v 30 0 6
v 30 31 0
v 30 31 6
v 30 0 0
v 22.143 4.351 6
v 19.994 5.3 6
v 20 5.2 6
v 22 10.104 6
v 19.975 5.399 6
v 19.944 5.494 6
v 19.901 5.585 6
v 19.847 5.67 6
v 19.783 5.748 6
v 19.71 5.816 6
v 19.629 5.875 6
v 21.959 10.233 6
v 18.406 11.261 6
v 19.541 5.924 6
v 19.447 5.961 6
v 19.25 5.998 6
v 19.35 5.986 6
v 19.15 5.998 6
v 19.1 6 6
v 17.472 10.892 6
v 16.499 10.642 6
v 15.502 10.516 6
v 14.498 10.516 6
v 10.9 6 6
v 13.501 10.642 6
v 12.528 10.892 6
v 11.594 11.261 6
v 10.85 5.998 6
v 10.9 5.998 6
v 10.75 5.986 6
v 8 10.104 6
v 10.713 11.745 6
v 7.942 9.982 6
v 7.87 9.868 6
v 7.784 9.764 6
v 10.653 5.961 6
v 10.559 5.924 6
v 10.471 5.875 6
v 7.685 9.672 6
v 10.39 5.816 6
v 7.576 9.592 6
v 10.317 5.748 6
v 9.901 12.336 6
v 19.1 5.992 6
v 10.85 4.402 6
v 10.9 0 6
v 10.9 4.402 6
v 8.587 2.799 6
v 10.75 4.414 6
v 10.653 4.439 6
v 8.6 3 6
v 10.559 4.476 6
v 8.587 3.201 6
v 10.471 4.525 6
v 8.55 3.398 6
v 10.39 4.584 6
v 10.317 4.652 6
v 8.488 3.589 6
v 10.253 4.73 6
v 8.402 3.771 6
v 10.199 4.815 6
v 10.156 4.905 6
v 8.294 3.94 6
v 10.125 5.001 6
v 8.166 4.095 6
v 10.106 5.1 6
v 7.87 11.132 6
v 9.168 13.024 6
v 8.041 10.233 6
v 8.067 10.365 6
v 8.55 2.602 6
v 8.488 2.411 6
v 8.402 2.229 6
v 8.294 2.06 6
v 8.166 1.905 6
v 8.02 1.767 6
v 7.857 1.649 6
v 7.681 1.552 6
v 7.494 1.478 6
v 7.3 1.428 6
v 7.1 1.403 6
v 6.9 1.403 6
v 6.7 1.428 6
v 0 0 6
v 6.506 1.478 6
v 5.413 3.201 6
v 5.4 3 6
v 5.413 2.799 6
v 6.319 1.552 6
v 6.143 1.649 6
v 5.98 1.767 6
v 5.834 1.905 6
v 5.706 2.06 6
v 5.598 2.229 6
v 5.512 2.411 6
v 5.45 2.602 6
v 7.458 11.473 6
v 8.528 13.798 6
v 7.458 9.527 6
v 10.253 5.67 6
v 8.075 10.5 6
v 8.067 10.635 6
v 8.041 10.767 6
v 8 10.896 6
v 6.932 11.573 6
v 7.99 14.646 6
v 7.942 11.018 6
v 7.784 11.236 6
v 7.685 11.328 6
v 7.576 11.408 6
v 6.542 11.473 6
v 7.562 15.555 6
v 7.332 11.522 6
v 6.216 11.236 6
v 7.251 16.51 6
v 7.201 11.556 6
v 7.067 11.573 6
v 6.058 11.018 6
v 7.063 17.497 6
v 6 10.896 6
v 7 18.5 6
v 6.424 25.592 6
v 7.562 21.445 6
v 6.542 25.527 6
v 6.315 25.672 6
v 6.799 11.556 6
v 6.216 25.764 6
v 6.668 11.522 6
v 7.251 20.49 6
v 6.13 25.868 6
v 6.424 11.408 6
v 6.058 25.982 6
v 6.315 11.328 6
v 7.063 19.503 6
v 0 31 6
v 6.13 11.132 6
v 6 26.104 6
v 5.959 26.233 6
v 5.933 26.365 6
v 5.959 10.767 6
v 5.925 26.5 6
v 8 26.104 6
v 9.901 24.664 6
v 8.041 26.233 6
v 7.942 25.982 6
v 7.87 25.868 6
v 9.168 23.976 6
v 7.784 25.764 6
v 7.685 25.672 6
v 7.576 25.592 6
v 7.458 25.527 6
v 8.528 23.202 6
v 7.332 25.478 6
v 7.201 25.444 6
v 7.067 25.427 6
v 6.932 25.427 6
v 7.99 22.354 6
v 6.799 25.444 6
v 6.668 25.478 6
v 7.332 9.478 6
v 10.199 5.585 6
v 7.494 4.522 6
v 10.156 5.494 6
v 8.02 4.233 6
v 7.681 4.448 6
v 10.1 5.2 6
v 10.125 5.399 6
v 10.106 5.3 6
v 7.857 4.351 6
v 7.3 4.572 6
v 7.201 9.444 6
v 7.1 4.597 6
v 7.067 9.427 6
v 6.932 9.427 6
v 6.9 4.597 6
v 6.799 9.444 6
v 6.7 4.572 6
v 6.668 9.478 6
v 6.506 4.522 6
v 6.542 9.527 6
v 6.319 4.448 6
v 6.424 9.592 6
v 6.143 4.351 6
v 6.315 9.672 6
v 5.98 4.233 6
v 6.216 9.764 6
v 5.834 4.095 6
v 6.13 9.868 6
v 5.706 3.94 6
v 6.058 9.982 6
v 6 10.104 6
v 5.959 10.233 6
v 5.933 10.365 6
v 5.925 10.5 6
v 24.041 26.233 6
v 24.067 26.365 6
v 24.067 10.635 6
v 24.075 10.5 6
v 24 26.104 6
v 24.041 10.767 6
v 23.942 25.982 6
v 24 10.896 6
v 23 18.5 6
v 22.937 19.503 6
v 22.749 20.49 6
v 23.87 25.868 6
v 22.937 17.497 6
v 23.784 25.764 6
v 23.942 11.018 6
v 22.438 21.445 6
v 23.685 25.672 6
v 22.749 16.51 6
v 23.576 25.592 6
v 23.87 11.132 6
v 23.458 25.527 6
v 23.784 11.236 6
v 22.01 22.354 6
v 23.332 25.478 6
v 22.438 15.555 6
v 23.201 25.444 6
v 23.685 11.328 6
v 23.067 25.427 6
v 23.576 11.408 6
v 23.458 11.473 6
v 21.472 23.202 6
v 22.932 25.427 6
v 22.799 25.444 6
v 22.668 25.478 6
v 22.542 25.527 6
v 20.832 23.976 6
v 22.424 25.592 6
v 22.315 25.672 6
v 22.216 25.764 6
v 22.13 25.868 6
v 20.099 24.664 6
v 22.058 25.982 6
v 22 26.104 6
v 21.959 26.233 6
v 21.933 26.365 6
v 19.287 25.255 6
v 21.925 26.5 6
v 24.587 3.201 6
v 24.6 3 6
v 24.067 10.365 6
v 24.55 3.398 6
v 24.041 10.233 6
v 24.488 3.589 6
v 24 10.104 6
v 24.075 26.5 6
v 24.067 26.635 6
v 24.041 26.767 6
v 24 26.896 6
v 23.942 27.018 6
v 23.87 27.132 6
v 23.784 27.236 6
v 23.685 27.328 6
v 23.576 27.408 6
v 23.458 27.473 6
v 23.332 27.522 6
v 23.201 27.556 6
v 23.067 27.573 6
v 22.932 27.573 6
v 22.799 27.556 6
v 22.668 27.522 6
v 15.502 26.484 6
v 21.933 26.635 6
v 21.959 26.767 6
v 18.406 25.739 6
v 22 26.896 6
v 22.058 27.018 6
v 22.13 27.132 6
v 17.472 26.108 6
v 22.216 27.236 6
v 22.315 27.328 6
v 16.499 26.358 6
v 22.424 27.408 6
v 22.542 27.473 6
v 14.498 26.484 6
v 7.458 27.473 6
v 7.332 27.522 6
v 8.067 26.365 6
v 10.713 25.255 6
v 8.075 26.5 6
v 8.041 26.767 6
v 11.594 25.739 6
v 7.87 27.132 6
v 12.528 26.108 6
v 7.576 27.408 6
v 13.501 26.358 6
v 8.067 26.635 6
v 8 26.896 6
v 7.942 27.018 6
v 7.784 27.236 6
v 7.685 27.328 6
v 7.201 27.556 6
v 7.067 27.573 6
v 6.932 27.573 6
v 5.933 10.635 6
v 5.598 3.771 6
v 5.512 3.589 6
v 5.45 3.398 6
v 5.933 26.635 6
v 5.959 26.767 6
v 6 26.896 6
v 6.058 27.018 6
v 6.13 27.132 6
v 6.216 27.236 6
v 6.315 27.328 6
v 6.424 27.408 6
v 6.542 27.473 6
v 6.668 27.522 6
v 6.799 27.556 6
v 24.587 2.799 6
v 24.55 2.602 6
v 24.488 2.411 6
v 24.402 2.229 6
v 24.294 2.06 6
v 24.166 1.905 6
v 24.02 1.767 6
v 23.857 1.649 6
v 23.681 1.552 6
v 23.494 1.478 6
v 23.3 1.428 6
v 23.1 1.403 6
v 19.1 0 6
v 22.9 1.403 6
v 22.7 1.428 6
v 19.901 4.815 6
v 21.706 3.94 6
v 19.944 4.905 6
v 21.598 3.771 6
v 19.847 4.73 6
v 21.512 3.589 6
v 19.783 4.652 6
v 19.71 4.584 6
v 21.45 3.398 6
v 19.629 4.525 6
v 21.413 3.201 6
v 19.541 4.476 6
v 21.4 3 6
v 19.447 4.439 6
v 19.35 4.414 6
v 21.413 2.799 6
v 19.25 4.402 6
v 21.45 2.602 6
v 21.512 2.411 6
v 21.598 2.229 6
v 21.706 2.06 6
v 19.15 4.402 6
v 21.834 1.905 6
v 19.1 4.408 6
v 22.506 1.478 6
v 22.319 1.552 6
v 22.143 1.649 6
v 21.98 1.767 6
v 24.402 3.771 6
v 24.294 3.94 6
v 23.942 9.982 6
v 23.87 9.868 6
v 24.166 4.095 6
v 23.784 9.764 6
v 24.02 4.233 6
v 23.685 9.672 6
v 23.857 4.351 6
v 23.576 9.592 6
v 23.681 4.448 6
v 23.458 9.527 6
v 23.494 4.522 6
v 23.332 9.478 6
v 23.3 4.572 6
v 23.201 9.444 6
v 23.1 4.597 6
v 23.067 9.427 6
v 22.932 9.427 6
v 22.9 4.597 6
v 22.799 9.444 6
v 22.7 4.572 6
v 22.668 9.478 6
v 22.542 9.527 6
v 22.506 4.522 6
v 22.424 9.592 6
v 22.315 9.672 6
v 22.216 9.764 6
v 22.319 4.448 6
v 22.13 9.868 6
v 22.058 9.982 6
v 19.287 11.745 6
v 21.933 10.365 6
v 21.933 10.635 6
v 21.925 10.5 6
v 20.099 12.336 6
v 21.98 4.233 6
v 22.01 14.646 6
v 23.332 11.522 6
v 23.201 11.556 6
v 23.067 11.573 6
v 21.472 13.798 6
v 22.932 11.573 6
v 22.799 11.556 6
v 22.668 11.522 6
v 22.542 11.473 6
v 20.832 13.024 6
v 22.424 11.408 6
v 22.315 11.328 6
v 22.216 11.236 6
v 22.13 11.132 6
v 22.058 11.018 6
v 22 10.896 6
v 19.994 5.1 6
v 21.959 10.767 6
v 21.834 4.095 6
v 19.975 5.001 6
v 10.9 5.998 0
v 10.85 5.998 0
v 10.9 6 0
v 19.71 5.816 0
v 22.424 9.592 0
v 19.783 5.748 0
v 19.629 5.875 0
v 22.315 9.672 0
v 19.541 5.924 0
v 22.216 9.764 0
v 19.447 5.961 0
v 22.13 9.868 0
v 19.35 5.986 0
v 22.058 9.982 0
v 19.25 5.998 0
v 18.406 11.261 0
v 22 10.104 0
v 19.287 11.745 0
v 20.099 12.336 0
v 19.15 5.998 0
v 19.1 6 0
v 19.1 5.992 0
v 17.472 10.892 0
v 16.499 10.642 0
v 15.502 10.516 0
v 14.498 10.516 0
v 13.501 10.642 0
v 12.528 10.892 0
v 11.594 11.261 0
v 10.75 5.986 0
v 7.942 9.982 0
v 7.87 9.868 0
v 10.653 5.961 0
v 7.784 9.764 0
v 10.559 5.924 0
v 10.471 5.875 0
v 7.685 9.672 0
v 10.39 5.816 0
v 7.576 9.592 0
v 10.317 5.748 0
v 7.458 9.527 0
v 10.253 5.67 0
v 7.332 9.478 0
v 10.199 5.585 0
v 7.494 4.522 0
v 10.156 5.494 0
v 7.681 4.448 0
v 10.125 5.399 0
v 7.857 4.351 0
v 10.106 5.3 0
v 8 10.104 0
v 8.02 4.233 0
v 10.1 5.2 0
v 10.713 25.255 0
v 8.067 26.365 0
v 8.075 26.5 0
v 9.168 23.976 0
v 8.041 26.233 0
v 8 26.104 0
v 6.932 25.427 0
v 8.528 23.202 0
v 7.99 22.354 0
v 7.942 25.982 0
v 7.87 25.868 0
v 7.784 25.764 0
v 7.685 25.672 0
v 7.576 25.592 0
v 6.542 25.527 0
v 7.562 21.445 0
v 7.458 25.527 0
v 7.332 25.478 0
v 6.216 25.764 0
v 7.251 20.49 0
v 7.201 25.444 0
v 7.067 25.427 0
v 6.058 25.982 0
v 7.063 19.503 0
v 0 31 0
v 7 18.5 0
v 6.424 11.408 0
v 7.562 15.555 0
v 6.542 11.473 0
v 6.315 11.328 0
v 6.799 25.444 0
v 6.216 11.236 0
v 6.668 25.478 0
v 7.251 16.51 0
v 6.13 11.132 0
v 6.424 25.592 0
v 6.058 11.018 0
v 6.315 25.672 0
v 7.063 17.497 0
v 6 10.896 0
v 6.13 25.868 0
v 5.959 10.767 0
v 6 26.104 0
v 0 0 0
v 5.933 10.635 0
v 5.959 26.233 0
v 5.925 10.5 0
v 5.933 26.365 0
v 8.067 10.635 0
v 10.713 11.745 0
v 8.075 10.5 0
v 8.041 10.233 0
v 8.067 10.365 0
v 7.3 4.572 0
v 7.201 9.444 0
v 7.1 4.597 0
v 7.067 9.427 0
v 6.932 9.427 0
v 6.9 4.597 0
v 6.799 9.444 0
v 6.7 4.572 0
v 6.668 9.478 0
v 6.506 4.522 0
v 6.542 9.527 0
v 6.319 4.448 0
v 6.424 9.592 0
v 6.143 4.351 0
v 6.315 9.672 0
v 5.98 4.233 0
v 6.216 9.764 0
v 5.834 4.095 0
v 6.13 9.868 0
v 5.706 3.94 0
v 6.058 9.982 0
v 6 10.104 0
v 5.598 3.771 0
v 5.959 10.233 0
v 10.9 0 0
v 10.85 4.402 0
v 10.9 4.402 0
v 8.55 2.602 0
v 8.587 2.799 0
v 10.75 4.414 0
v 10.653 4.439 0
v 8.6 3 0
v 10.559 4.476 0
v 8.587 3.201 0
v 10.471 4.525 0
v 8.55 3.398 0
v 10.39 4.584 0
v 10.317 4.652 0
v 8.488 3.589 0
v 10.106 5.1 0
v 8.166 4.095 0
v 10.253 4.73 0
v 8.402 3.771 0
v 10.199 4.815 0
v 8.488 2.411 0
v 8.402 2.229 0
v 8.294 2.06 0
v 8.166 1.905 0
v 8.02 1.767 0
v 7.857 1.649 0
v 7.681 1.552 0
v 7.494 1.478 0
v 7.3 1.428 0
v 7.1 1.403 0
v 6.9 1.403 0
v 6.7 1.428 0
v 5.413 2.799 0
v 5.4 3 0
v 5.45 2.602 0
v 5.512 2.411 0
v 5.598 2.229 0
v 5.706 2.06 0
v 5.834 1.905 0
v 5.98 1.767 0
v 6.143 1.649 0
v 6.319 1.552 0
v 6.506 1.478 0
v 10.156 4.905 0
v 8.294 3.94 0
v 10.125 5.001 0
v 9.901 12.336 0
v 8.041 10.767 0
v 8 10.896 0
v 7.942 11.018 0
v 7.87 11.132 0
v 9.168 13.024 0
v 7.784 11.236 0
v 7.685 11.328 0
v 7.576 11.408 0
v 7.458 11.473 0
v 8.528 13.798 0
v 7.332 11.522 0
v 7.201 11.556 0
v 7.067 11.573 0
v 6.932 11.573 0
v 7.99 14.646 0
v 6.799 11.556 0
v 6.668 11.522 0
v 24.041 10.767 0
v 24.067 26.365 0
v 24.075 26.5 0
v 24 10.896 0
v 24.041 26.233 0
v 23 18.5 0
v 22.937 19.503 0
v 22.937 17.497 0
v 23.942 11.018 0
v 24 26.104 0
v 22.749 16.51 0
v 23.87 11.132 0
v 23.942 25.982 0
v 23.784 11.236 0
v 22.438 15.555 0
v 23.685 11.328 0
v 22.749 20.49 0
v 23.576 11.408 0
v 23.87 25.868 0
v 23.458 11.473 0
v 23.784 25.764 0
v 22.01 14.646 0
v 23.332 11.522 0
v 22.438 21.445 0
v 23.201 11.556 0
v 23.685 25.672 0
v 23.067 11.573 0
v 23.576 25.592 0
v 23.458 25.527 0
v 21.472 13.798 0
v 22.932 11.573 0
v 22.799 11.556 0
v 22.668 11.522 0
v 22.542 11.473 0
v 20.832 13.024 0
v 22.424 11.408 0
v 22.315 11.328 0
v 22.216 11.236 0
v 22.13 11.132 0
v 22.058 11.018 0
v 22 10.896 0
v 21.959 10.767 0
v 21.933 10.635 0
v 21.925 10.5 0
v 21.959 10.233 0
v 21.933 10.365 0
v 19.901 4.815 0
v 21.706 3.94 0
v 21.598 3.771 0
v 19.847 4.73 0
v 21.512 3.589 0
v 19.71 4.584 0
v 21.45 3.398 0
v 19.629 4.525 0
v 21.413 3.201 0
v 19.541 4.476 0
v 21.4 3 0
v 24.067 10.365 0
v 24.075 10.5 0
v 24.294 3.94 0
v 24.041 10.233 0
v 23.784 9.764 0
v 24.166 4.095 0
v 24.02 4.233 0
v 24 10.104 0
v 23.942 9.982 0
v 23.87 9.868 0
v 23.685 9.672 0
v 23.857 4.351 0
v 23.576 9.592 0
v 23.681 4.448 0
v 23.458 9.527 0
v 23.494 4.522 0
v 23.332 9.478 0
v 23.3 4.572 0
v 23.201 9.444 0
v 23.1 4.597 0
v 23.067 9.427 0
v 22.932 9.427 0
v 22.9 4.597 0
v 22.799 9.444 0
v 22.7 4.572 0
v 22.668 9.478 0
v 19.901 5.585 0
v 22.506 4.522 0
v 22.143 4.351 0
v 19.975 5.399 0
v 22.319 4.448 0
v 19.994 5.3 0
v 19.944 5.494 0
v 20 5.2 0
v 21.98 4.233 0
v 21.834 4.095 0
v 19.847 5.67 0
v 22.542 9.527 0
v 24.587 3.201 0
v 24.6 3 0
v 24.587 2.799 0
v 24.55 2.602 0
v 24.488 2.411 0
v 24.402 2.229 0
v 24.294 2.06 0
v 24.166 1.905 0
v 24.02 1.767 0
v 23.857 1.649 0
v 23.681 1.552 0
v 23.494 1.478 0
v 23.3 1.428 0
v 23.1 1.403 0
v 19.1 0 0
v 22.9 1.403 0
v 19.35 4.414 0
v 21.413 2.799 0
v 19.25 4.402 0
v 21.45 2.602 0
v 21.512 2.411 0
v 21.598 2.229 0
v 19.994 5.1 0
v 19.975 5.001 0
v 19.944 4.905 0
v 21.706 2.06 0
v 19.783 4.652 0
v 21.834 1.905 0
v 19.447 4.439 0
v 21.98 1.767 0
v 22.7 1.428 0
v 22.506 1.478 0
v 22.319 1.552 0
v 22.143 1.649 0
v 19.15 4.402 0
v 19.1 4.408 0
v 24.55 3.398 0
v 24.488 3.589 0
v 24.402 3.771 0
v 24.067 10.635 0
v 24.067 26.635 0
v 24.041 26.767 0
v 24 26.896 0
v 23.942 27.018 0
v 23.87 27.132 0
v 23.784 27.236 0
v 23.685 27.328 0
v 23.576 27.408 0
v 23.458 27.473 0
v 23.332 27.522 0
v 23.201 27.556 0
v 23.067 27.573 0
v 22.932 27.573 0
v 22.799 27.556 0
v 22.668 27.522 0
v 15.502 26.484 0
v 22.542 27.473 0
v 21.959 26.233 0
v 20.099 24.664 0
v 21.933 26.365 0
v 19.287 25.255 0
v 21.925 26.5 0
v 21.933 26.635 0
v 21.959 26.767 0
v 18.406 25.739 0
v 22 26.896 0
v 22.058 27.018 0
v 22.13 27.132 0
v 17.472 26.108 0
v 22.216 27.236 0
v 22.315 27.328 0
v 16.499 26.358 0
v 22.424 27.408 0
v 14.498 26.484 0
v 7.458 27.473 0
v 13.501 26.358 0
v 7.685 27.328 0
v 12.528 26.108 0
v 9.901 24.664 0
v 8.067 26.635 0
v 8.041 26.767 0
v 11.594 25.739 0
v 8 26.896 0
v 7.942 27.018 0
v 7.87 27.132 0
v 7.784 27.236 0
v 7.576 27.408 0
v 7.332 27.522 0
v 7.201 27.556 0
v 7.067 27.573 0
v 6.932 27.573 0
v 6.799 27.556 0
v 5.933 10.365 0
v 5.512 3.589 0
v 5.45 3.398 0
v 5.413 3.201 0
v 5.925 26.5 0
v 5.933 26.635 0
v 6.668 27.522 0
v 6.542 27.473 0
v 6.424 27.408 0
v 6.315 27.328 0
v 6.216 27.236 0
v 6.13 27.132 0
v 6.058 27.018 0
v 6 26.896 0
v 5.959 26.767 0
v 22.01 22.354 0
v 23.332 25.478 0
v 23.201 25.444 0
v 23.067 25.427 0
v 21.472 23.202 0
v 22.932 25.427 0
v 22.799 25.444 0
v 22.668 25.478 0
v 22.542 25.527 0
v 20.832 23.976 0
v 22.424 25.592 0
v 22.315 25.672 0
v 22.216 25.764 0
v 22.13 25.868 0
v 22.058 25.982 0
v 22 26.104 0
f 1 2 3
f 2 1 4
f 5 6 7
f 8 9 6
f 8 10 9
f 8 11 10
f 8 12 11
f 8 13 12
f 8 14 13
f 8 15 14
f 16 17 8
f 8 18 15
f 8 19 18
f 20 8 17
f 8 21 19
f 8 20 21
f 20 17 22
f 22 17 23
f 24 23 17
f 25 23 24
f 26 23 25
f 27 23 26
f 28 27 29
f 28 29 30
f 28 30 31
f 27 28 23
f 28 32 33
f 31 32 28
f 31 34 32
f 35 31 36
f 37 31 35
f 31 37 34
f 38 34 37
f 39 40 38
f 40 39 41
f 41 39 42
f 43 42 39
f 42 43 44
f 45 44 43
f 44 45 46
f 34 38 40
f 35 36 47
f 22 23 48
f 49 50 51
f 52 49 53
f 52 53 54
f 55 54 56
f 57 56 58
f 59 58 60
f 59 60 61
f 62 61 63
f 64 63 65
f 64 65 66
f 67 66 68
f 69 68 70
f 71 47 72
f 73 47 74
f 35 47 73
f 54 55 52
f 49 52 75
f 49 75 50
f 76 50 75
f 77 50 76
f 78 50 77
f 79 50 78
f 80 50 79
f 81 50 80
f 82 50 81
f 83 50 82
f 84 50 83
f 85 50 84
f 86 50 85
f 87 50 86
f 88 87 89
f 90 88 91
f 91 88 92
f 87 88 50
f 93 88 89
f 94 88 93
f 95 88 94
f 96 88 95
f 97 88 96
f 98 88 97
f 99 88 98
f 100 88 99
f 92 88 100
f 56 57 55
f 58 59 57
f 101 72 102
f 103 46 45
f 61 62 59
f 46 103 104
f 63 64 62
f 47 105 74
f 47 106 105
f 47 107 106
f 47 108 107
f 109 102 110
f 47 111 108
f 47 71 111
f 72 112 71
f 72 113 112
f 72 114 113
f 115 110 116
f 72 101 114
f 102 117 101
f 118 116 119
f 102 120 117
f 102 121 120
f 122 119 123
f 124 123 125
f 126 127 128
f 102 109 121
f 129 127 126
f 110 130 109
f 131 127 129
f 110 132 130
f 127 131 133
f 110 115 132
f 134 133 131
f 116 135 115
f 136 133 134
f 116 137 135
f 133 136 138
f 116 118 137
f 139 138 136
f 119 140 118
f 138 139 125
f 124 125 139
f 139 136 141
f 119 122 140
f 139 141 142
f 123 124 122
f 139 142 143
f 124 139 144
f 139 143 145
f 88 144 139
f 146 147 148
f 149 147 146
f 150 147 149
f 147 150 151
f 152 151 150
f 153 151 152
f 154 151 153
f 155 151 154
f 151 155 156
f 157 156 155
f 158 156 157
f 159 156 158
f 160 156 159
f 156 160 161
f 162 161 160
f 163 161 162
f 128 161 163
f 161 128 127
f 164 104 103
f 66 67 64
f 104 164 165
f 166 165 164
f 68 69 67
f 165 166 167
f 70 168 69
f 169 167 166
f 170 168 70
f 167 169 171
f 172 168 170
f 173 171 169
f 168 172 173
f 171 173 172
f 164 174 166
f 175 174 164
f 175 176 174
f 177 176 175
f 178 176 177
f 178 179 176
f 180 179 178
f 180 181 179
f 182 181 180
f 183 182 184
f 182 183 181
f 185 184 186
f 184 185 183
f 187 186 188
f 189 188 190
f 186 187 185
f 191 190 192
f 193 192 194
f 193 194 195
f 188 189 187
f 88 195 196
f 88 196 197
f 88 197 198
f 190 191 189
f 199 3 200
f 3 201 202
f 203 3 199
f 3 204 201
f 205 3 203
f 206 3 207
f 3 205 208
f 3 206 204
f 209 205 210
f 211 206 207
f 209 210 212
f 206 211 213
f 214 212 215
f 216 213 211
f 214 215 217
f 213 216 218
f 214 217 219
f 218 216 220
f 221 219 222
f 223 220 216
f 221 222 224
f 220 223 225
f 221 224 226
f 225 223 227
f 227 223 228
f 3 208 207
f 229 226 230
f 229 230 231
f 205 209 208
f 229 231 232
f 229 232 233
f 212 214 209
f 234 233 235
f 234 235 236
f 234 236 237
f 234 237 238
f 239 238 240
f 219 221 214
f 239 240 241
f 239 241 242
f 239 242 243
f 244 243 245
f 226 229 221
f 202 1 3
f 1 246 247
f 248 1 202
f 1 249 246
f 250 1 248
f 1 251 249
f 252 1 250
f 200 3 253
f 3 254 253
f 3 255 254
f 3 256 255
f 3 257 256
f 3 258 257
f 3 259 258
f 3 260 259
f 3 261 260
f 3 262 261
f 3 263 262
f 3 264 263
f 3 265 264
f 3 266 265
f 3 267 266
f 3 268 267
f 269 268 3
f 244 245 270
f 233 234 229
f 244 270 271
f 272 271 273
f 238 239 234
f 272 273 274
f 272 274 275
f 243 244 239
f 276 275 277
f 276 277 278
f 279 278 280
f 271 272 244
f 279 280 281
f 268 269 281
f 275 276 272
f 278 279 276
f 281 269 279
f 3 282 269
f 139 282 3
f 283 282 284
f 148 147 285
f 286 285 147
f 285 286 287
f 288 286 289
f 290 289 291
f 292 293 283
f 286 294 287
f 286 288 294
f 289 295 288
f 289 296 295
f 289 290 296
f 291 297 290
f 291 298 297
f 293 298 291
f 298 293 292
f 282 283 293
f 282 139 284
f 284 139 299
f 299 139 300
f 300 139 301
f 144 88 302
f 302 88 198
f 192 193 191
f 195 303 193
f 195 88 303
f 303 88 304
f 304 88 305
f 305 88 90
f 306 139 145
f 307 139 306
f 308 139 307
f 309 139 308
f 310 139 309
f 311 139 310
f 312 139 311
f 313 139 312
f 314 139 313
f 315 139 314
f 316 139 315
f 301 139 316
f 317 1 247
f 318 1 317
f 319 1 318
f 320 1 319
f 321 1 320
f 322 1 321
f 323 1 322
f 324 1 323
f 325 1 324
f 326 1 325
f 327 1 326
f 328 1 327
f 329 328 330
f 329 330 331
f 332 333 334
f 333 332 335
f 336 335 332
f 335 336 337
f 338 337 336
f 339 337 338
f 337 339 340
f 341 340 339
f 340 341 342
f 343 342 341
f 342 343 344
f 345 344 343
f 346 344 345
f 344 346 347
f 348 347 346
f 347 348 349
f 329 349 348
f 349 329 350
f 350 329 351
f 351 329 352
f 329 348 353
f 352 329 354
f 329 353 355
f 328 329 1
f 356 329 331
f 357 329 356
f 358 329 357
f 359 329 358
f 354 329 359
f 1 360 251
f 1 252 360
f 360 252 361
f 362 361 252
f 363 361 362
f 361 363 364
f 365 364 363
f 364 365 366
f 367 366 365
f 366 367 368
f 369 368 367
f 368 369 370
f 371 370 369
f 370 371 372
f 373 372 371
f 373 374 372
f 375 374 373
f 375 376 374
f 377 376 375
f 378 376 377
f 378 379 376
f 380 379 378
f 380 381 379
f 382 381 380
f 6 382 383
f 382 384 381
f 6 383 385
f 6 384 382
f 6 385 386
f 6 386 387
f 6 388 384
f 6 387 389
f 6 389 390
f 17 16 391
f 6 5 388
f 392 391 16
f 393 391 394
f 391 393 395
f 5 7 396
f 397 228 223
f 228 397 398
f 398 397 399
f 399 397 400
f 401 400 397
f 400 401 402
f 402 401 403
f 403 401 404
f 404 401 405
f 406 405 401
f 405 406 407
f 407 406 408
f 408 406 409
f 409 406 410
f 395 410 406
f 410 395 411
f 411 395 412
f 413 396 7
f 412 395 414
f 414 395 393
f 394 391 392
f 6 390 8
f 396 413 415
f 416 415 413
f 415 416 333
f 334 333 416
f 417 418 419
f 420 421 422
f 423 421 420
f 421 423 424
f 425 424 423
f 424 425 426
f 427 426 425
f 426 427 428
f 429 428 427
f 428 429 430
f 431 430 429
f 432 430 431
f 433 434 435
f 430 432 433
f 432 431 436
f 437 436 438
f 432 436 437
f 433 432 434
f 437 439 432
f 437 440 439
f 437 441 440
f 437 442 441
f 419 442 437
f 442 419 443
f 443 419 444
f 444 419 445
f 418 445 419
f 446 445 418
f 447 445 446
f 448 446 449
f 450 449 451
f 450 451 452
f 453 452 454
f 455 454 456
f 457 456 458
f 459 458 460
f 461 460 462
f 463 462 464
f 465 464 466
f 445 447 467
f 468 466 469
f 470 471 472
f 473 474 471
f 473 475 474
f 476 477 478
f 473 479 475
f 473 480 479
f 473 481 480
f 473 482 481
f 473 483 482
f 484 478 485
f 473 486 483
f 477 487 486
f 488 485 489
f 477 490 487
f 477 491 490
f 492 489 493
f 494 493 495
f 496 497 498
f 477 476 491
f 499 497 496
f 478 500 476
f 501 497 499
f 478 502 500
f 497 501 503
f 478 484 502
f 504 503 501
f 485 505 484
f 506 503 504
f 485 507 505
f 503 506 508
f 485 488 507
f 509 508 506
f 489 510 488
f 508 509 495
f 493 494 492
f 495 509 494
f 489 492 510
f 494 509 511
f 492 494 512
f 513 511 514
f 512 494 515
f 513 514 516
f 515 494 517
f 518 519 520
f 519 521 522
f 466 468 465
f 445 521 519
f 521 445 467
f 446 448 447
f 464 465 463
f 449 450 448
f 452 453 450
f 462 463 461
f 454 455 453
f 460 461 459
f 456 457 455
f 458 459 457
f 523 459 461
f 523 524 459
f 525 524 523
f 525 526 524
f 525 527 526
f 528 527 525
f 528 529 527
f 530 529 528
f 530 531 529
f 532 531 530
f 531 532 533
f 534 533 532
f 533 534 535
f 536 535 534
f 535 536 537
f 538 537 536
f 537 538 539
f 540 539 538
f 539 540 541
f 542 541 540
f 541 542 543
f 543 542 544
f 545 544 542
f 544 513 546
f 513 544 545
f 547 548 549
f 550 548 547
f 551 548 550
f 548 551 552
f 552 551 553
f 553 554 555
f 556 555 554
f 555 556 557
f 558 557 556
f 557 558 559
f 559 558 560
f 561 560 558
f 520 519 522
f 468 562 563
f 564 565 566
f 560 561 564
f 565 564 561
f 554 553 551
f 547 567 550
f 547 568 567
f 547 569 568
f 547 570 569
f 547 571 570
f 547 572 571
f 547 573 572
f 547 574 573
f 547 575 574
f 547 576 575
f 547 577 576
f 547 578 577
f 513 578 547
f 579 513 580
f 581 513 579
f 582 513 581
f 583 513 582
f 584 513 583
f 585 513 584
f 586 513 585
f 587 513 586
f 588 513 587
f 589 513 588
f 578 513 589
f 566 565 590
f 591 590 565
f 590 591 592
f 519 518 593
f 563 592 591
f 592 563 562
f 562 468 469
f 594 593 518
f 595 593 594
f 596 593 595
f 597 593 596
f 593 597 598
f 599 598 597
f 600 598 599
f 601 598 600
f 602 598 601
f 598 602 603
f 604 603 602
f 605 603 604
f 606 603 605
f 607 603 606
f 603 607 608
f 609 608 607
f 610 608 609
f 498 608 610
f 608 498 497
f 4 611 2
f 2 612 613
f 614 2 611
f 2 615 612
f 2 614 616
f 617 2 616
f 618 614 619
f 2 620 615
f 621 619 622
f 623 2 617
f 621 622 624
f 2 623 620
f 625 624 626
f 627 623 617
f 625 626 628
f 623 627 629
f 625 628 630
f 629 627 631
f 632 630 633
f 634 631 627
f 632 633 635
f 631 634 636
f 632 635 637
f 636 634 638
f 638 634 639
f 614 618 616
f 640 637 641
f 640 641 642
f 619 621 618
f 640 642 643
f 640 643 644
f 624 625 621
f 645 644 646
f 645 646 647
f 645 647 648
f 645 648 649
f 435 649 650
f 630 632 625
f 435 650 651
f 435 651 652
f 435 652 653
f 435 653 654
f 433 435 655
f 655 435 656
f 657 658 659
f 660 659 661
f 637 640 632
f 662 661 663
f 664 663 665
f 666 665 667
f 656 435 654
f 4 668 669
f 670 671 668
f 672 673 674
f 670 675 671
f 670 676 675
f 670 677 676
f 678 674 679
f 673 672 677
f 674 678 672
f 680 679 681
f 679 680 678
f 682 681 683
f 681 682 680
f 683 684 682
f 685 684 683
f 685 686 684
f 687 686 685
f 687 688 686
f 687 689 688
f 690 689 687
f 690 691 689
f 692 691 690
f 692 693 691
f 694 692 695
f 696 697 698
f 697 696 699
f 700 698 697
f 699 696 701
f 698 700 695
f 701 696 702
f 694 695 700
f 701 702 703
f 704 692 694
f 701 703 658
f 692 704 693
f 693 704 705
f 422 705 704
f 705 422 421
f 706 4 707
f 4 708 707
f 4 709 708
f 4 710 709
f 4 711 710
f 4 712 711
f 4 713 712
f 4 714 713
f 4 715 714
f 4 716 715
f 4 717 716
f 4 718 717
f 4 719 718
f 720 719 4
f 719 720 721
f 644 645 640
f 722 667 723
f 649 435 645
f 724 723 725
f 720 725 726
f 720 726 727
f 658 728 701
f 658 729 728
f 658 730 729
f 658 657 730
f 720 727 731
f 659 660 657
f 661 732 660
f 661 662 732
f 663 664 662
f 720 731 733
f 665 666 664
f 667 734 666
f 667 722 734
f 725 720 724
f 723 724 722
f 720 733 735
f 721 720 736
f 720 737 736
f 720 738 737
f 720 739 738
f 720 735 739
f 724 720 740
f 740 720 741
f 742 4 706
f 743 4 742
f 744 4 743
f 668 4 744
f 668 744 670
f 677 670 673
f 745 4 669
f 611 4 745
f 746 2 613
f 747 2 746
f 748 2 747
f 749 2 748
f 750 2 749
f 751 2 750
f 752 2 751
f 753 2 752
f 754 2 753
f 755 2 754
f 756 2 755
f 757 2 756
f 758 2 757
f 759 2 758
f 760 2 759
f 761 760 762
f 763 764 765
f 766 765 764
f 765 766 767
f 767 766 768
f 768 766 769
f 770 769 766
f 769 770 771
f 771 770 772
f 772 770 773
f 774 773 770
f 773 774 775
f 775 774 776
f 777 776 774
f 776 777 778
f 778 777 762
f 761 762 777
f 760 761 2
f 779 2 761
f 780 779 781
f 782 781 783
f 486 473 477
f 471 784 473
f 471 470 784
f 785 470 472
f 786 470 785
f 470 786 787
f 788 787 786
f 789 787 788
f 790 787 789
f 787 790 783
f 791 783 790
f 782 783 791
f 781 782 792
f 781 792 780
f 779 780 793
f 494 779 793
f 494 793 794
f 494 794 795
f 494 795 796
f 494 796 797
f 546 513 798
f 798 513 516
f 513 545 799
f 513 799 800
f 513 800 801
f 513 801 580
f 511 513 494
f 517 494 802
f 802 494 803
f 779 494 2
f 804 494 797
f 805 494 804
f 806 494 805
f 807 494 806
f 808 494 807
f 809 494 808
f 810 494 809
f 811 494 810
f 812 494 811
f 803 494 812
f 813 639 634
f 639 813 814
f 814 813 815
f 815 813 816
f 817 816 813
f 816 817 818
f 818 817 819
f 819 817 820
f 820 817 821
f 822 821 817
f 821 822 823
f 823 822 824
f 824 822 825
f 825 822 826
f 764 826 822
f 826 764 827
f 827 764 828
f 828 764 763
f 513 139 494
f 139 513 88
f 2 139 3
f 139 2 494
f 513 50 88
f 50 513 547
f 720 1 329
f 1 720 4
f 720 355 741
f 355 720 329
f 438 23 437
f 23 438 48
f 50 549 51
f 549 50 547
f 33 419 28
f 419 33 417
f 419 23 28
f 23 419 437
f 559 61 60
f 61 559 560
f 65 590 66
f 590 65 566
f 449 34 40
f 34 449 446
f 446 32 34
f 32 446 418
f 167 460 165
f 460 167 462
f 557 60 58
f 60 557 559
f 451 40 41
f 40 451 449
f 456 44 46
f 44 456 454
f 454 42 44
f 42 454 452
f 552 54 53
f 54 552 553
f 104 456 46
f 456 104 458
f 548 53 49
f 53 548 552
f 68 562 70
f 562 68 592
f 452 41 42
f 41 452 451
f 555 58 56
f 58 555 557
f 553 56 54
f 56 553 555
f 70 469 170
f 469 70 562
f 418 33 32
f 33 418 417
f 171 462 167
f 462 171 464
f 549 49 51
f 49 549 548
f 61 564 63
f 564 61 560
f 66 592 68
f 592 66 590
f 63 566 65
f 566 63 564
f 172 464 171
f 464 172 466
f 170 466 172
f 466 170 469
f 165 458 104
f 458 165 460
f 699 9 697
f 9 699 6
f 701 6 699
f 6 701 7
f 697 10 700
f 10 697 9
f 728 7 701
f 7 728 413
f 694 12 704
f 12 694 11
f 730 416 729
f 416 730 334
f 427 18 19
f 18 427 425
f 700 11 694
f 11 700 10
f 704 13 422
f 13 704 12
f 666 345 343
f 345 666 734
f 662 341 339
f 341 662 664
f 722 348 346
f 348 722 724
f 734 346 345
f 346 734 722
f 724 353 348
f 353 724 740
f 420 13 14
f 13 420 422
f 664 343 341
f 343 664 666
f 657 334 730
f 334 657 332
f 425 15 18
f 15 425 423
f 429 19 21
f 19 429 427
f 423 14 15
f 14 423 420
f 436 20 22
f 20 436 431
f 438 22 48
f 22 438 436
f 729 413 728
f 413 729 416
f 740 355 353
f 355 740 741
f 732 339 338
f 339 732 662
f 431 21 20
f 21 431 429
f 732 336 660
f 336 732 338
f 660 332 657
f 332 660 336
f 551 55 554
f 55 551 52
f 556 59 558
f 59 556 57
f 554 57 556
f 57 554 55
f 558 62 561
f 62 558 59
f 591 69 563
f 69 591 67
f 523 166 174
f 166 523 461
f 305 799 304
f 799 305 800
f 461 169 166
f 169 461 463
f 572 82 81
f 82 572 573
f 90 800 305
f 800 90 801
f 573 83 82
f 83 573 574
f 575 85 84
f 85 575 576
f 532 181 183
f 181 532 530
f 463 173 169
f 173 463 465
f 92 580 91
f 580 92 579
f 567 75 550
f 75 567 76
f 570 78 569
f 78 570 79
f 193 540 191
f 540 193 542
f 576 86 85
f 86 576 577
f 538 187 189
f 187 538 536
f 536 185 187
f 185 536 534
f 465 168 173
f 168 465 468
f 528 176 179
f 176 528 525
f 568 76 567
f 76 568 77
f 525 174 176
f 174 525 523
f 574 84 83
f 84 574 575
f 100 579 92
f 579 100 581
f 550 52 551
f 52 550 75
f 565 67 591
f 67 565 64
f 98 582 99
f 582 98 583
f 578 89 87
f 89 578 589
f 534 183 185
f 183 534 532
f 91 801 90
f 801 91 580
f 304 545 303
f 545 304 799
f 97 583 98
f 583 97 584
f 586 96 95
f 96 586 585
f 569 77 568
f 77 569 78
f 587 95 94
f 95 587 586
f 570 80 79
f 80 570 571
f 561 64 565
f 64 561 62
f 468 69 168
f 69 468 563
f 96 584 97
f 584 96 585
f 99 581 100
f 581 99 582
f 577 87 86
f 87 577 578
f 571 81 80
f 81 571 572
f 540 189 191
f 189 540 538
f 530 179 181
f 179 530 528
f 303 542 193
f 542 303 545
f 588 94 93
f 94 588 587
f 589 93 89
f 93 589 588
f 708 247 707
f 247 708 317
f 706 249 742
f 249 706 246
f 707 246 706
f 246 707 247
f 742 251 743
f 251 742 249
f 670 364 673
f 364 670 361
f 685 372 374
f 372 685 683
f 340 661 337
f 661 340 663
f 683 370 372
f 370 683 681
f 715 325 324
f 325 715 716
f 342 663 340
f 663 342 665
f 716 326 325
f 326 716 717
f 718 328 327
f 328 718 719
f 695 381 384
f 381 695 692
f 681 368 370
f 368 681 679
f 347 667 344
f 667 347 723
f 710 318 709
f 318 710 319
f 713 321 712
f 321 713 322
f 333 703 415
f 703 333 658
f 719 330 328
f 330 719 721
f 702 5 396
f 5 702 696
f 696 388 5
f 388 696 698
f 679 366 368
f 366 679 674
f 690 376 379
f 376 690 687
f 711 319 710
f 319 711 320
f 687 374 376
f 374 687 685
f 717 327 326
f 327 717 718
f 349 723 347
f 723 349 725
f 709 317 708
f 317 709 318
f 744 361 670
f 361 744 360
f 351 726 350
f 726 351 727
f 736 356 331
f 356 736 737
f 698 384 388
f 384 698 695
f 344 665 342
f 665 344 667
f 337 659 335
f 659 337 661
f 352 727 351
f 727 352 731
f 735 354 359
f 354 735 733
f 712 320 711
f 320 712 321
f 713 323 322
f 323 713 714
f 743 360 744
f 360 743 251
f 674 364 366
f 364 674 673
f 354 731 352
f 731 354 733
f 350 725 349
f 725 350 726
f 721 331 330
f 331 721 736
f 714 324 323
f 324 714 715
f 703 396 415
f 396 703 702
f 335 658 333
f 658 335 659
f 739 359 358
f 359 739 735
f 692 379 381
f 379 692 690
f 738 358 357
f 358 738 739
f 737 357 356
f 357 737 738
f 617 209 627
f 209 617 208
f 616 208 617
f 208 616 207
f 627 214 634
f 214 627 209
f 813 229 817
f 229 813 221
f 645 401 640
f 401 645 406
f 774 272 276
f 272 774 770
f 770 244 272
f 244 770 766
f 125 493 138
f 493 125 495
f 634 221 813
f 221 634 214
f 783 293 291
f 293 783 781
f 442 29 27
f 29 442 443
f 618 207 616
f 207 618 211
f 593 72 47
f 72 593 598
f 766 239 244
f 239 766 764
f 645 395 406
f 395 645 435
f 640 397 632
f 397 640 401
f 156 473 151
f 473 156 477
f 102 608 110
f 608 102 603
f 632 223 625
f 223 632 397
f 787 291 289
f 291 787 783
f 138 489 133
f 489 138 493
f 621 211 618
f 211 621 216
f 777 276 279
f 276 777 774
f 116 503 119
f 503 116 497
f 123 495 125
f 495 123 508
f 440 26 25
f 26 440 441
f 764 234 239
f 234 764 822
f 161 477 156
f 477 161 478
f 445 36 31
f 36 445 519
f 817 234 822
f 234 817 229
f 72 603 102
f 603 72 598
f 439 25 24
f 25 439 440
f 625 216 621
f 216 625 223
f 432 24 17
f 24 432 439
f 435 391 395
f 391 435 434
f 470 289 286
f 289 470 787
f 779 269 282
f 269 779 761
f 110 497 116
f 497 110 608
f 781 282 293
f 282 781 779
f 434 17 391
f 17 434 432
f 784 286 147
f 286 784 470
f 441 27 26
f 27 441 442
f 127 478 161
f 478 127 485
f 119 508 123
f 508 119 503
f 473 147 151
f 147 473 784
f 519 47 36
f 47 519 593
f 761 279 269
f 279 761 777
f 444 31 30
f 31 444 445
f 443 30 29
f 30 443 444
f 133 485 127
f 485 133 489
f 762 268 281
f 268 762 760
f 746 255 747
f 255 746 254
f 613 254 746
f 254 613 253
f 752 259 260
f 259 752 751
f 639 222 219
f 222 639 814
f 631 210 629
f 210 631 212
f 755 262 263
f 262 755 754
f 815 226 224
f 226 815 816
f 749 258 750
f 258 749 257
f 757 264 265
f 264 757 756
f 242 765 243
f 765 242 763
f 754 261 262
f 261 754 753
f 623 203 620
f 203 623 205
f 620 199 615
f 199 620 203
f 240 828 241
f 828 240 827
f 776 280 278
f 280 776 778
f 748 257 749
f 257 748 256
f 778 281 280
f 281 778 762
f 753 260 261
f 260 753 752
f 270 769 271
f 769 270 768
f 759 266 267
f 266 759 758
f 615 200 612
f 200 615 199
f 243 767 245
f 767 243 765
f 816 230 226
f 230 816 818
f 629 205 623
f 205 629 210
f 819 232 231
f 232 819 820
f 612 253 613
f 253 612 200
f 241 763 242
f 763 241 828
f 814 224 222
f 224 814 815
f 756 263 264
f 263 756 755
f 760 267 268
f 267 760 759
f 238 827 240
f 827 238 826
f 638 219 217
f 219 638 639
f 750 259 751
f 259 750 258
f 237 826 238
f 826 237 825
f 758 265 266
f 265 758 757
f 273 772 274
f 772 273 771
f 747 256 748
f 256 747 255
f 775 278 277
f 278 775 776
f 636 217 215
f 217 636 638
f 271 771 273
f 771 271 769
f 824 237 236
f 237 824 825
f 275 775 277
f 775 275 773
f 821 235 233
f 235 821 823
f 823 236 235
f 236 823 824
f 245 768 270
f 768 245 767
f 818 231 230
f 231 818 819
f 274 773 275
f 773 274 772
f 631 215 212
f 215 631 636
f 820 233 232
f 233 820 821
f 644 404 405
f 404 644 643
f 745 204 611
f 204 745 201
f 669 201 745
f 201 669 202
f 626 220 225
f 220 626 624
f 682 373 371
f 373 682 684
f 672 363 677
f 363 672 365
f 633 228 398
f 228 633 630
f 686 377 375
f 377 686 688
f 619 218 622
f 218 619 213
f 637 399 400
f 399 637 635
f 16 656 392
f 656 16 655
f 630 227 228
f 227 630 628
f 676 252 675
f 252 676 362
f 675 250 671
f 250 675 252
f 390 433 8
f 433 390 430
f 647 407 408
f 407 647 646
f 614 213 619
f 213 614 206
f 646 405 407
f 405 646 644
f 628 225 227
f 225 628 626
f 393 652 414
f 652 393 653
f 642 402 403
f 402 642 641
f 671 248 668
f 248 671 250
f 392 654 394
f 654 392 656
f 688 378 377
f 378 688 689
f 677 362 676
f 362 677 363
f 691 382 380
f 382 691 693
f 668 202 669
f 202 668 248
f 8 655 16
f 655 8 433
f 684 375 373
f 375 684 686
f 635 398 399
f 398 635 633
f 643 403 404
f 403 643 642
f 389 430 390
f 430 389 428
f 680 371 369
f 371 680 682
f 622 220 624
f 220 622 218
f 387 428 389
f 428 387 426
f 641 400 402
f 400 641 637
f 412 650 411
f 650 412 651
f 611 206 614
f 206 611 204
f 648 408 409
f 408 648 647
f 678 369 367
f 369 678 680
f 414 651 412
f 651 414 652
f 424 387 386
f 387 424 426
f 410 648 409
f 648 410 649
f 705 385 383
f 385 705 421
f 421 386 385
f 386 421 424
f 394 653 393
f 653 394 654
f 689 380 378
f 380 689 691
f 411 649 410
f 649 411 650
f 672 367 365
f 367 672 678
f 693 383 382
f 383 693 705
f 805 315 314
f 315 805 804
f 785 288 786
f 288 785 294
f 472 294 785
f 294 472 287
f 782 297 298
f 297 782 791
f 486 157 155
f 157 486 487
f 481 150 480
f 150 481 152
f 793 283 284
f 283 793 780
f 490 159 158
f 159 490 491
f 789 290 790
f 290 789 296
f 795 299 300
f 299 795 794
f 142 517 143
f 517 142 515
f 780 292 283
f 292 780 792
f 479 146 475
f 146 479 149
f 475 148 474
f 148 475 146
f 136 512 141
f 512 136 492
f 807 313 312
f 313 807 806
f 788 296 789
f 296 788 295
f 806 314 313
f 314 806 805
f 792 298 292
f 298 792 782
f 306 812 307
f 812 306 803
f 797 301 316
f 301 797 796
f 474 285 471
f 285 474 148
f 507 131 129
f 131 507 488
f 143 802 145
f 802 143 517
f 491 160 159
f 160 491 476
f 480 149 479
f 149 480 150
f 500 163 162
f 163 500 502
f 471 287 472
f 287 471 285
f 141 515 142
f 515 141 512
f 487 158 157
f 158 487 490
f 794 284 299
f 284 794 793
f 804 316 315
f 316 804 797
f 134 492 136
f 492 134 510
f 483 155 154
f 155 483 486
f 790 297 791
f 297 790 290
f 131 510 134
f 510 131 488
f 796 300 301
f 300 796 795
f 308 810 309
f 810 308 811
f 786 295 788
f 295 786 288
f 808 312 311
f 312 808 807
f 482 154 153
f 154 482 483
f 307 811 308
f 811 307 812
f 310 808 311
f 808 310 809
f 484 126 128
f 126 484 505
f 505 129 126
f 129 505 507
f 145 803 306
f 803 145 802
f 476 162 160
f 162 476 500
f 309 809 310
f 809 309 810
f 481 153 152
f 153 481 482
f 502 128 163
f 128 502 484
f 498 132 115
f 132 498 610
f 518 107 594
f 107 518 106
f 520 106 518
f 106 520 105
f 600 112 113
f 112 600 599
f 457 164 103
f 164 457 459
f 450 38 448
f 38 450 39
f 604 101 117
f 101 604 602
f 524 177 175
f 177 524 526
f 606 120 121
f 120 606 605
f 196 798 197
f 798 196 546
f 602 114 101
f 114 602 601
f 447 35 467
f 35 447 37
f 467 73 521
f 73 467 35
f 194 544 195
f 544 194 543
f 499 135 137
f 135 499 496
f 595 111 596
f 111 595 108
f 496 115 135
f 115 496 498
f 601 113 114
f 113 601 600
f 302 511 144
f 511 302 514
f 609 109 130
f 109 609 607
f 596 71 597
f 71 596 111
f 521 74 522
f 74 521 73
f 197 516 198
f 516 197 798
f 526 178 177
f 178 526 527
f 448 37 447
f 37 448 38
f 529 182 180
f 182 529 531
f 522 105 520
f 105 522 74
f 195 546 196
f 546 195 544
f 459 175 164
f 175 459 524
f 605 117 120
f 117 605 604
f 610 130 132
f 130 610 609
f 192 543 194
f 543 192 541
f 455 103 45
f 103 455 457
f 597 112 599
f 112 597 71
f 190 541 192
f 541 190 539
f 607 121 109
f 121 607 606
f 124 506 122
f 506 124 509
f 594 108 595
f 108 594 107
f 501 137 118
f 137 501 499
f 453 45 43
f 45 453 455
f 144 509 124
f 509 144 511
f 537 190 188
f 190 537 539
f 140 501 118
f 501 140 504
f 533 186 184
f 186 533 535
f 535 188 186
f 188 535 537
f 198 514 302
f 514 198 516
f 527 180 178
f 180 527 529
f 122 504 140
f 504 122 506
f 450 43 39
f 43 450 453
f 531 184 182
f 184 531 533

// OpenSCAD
$fn=50;
$drill3=3.2;
$drill2=2.15;

$thickness=6;
difference() {
    cube([30,25+$thickness,$thickness]);
    translate([10.9,-1,-1]) cube([8.2,$thickness+1,$thickness+2]);
    translate([10.9,$thickness-0.8,-1]) cylinder(r=0.8,h=$thickness+2);
    translate([19.2,$thickness-0.8,-1]) cylinder(r=0.8,h=$thickness+2);

    translate([7,$thickness/2,-1]) cylinder(r=$drill3/2,h=$thickness+2);
    translate([23,$thickness/2,-1]) cylinder(r=$drill3/2,h=$thickness+2);

    // Motor
    translate([15, 12.5+$thickness, -1]) cylinder(r=8,h=$thickness+2);
    translate([15+8, 12.5+$thickness+8, -1]) cylinder(r=$drill2/2,h=$thickness+2);
    translate([15+8, 12.5+$thickness-8, -1]) cylinder(r=$drill2/2,h=$thickness+2);
    translate([15-8, 12.5+$thickness+8, -1]) cylinder(r=$drill2/2,h=$thickness+2);
    translate([15-8, 12.5+$thickness-8, -1]) cylinder(r=$drill2/2,h=$thickness+2);
}
